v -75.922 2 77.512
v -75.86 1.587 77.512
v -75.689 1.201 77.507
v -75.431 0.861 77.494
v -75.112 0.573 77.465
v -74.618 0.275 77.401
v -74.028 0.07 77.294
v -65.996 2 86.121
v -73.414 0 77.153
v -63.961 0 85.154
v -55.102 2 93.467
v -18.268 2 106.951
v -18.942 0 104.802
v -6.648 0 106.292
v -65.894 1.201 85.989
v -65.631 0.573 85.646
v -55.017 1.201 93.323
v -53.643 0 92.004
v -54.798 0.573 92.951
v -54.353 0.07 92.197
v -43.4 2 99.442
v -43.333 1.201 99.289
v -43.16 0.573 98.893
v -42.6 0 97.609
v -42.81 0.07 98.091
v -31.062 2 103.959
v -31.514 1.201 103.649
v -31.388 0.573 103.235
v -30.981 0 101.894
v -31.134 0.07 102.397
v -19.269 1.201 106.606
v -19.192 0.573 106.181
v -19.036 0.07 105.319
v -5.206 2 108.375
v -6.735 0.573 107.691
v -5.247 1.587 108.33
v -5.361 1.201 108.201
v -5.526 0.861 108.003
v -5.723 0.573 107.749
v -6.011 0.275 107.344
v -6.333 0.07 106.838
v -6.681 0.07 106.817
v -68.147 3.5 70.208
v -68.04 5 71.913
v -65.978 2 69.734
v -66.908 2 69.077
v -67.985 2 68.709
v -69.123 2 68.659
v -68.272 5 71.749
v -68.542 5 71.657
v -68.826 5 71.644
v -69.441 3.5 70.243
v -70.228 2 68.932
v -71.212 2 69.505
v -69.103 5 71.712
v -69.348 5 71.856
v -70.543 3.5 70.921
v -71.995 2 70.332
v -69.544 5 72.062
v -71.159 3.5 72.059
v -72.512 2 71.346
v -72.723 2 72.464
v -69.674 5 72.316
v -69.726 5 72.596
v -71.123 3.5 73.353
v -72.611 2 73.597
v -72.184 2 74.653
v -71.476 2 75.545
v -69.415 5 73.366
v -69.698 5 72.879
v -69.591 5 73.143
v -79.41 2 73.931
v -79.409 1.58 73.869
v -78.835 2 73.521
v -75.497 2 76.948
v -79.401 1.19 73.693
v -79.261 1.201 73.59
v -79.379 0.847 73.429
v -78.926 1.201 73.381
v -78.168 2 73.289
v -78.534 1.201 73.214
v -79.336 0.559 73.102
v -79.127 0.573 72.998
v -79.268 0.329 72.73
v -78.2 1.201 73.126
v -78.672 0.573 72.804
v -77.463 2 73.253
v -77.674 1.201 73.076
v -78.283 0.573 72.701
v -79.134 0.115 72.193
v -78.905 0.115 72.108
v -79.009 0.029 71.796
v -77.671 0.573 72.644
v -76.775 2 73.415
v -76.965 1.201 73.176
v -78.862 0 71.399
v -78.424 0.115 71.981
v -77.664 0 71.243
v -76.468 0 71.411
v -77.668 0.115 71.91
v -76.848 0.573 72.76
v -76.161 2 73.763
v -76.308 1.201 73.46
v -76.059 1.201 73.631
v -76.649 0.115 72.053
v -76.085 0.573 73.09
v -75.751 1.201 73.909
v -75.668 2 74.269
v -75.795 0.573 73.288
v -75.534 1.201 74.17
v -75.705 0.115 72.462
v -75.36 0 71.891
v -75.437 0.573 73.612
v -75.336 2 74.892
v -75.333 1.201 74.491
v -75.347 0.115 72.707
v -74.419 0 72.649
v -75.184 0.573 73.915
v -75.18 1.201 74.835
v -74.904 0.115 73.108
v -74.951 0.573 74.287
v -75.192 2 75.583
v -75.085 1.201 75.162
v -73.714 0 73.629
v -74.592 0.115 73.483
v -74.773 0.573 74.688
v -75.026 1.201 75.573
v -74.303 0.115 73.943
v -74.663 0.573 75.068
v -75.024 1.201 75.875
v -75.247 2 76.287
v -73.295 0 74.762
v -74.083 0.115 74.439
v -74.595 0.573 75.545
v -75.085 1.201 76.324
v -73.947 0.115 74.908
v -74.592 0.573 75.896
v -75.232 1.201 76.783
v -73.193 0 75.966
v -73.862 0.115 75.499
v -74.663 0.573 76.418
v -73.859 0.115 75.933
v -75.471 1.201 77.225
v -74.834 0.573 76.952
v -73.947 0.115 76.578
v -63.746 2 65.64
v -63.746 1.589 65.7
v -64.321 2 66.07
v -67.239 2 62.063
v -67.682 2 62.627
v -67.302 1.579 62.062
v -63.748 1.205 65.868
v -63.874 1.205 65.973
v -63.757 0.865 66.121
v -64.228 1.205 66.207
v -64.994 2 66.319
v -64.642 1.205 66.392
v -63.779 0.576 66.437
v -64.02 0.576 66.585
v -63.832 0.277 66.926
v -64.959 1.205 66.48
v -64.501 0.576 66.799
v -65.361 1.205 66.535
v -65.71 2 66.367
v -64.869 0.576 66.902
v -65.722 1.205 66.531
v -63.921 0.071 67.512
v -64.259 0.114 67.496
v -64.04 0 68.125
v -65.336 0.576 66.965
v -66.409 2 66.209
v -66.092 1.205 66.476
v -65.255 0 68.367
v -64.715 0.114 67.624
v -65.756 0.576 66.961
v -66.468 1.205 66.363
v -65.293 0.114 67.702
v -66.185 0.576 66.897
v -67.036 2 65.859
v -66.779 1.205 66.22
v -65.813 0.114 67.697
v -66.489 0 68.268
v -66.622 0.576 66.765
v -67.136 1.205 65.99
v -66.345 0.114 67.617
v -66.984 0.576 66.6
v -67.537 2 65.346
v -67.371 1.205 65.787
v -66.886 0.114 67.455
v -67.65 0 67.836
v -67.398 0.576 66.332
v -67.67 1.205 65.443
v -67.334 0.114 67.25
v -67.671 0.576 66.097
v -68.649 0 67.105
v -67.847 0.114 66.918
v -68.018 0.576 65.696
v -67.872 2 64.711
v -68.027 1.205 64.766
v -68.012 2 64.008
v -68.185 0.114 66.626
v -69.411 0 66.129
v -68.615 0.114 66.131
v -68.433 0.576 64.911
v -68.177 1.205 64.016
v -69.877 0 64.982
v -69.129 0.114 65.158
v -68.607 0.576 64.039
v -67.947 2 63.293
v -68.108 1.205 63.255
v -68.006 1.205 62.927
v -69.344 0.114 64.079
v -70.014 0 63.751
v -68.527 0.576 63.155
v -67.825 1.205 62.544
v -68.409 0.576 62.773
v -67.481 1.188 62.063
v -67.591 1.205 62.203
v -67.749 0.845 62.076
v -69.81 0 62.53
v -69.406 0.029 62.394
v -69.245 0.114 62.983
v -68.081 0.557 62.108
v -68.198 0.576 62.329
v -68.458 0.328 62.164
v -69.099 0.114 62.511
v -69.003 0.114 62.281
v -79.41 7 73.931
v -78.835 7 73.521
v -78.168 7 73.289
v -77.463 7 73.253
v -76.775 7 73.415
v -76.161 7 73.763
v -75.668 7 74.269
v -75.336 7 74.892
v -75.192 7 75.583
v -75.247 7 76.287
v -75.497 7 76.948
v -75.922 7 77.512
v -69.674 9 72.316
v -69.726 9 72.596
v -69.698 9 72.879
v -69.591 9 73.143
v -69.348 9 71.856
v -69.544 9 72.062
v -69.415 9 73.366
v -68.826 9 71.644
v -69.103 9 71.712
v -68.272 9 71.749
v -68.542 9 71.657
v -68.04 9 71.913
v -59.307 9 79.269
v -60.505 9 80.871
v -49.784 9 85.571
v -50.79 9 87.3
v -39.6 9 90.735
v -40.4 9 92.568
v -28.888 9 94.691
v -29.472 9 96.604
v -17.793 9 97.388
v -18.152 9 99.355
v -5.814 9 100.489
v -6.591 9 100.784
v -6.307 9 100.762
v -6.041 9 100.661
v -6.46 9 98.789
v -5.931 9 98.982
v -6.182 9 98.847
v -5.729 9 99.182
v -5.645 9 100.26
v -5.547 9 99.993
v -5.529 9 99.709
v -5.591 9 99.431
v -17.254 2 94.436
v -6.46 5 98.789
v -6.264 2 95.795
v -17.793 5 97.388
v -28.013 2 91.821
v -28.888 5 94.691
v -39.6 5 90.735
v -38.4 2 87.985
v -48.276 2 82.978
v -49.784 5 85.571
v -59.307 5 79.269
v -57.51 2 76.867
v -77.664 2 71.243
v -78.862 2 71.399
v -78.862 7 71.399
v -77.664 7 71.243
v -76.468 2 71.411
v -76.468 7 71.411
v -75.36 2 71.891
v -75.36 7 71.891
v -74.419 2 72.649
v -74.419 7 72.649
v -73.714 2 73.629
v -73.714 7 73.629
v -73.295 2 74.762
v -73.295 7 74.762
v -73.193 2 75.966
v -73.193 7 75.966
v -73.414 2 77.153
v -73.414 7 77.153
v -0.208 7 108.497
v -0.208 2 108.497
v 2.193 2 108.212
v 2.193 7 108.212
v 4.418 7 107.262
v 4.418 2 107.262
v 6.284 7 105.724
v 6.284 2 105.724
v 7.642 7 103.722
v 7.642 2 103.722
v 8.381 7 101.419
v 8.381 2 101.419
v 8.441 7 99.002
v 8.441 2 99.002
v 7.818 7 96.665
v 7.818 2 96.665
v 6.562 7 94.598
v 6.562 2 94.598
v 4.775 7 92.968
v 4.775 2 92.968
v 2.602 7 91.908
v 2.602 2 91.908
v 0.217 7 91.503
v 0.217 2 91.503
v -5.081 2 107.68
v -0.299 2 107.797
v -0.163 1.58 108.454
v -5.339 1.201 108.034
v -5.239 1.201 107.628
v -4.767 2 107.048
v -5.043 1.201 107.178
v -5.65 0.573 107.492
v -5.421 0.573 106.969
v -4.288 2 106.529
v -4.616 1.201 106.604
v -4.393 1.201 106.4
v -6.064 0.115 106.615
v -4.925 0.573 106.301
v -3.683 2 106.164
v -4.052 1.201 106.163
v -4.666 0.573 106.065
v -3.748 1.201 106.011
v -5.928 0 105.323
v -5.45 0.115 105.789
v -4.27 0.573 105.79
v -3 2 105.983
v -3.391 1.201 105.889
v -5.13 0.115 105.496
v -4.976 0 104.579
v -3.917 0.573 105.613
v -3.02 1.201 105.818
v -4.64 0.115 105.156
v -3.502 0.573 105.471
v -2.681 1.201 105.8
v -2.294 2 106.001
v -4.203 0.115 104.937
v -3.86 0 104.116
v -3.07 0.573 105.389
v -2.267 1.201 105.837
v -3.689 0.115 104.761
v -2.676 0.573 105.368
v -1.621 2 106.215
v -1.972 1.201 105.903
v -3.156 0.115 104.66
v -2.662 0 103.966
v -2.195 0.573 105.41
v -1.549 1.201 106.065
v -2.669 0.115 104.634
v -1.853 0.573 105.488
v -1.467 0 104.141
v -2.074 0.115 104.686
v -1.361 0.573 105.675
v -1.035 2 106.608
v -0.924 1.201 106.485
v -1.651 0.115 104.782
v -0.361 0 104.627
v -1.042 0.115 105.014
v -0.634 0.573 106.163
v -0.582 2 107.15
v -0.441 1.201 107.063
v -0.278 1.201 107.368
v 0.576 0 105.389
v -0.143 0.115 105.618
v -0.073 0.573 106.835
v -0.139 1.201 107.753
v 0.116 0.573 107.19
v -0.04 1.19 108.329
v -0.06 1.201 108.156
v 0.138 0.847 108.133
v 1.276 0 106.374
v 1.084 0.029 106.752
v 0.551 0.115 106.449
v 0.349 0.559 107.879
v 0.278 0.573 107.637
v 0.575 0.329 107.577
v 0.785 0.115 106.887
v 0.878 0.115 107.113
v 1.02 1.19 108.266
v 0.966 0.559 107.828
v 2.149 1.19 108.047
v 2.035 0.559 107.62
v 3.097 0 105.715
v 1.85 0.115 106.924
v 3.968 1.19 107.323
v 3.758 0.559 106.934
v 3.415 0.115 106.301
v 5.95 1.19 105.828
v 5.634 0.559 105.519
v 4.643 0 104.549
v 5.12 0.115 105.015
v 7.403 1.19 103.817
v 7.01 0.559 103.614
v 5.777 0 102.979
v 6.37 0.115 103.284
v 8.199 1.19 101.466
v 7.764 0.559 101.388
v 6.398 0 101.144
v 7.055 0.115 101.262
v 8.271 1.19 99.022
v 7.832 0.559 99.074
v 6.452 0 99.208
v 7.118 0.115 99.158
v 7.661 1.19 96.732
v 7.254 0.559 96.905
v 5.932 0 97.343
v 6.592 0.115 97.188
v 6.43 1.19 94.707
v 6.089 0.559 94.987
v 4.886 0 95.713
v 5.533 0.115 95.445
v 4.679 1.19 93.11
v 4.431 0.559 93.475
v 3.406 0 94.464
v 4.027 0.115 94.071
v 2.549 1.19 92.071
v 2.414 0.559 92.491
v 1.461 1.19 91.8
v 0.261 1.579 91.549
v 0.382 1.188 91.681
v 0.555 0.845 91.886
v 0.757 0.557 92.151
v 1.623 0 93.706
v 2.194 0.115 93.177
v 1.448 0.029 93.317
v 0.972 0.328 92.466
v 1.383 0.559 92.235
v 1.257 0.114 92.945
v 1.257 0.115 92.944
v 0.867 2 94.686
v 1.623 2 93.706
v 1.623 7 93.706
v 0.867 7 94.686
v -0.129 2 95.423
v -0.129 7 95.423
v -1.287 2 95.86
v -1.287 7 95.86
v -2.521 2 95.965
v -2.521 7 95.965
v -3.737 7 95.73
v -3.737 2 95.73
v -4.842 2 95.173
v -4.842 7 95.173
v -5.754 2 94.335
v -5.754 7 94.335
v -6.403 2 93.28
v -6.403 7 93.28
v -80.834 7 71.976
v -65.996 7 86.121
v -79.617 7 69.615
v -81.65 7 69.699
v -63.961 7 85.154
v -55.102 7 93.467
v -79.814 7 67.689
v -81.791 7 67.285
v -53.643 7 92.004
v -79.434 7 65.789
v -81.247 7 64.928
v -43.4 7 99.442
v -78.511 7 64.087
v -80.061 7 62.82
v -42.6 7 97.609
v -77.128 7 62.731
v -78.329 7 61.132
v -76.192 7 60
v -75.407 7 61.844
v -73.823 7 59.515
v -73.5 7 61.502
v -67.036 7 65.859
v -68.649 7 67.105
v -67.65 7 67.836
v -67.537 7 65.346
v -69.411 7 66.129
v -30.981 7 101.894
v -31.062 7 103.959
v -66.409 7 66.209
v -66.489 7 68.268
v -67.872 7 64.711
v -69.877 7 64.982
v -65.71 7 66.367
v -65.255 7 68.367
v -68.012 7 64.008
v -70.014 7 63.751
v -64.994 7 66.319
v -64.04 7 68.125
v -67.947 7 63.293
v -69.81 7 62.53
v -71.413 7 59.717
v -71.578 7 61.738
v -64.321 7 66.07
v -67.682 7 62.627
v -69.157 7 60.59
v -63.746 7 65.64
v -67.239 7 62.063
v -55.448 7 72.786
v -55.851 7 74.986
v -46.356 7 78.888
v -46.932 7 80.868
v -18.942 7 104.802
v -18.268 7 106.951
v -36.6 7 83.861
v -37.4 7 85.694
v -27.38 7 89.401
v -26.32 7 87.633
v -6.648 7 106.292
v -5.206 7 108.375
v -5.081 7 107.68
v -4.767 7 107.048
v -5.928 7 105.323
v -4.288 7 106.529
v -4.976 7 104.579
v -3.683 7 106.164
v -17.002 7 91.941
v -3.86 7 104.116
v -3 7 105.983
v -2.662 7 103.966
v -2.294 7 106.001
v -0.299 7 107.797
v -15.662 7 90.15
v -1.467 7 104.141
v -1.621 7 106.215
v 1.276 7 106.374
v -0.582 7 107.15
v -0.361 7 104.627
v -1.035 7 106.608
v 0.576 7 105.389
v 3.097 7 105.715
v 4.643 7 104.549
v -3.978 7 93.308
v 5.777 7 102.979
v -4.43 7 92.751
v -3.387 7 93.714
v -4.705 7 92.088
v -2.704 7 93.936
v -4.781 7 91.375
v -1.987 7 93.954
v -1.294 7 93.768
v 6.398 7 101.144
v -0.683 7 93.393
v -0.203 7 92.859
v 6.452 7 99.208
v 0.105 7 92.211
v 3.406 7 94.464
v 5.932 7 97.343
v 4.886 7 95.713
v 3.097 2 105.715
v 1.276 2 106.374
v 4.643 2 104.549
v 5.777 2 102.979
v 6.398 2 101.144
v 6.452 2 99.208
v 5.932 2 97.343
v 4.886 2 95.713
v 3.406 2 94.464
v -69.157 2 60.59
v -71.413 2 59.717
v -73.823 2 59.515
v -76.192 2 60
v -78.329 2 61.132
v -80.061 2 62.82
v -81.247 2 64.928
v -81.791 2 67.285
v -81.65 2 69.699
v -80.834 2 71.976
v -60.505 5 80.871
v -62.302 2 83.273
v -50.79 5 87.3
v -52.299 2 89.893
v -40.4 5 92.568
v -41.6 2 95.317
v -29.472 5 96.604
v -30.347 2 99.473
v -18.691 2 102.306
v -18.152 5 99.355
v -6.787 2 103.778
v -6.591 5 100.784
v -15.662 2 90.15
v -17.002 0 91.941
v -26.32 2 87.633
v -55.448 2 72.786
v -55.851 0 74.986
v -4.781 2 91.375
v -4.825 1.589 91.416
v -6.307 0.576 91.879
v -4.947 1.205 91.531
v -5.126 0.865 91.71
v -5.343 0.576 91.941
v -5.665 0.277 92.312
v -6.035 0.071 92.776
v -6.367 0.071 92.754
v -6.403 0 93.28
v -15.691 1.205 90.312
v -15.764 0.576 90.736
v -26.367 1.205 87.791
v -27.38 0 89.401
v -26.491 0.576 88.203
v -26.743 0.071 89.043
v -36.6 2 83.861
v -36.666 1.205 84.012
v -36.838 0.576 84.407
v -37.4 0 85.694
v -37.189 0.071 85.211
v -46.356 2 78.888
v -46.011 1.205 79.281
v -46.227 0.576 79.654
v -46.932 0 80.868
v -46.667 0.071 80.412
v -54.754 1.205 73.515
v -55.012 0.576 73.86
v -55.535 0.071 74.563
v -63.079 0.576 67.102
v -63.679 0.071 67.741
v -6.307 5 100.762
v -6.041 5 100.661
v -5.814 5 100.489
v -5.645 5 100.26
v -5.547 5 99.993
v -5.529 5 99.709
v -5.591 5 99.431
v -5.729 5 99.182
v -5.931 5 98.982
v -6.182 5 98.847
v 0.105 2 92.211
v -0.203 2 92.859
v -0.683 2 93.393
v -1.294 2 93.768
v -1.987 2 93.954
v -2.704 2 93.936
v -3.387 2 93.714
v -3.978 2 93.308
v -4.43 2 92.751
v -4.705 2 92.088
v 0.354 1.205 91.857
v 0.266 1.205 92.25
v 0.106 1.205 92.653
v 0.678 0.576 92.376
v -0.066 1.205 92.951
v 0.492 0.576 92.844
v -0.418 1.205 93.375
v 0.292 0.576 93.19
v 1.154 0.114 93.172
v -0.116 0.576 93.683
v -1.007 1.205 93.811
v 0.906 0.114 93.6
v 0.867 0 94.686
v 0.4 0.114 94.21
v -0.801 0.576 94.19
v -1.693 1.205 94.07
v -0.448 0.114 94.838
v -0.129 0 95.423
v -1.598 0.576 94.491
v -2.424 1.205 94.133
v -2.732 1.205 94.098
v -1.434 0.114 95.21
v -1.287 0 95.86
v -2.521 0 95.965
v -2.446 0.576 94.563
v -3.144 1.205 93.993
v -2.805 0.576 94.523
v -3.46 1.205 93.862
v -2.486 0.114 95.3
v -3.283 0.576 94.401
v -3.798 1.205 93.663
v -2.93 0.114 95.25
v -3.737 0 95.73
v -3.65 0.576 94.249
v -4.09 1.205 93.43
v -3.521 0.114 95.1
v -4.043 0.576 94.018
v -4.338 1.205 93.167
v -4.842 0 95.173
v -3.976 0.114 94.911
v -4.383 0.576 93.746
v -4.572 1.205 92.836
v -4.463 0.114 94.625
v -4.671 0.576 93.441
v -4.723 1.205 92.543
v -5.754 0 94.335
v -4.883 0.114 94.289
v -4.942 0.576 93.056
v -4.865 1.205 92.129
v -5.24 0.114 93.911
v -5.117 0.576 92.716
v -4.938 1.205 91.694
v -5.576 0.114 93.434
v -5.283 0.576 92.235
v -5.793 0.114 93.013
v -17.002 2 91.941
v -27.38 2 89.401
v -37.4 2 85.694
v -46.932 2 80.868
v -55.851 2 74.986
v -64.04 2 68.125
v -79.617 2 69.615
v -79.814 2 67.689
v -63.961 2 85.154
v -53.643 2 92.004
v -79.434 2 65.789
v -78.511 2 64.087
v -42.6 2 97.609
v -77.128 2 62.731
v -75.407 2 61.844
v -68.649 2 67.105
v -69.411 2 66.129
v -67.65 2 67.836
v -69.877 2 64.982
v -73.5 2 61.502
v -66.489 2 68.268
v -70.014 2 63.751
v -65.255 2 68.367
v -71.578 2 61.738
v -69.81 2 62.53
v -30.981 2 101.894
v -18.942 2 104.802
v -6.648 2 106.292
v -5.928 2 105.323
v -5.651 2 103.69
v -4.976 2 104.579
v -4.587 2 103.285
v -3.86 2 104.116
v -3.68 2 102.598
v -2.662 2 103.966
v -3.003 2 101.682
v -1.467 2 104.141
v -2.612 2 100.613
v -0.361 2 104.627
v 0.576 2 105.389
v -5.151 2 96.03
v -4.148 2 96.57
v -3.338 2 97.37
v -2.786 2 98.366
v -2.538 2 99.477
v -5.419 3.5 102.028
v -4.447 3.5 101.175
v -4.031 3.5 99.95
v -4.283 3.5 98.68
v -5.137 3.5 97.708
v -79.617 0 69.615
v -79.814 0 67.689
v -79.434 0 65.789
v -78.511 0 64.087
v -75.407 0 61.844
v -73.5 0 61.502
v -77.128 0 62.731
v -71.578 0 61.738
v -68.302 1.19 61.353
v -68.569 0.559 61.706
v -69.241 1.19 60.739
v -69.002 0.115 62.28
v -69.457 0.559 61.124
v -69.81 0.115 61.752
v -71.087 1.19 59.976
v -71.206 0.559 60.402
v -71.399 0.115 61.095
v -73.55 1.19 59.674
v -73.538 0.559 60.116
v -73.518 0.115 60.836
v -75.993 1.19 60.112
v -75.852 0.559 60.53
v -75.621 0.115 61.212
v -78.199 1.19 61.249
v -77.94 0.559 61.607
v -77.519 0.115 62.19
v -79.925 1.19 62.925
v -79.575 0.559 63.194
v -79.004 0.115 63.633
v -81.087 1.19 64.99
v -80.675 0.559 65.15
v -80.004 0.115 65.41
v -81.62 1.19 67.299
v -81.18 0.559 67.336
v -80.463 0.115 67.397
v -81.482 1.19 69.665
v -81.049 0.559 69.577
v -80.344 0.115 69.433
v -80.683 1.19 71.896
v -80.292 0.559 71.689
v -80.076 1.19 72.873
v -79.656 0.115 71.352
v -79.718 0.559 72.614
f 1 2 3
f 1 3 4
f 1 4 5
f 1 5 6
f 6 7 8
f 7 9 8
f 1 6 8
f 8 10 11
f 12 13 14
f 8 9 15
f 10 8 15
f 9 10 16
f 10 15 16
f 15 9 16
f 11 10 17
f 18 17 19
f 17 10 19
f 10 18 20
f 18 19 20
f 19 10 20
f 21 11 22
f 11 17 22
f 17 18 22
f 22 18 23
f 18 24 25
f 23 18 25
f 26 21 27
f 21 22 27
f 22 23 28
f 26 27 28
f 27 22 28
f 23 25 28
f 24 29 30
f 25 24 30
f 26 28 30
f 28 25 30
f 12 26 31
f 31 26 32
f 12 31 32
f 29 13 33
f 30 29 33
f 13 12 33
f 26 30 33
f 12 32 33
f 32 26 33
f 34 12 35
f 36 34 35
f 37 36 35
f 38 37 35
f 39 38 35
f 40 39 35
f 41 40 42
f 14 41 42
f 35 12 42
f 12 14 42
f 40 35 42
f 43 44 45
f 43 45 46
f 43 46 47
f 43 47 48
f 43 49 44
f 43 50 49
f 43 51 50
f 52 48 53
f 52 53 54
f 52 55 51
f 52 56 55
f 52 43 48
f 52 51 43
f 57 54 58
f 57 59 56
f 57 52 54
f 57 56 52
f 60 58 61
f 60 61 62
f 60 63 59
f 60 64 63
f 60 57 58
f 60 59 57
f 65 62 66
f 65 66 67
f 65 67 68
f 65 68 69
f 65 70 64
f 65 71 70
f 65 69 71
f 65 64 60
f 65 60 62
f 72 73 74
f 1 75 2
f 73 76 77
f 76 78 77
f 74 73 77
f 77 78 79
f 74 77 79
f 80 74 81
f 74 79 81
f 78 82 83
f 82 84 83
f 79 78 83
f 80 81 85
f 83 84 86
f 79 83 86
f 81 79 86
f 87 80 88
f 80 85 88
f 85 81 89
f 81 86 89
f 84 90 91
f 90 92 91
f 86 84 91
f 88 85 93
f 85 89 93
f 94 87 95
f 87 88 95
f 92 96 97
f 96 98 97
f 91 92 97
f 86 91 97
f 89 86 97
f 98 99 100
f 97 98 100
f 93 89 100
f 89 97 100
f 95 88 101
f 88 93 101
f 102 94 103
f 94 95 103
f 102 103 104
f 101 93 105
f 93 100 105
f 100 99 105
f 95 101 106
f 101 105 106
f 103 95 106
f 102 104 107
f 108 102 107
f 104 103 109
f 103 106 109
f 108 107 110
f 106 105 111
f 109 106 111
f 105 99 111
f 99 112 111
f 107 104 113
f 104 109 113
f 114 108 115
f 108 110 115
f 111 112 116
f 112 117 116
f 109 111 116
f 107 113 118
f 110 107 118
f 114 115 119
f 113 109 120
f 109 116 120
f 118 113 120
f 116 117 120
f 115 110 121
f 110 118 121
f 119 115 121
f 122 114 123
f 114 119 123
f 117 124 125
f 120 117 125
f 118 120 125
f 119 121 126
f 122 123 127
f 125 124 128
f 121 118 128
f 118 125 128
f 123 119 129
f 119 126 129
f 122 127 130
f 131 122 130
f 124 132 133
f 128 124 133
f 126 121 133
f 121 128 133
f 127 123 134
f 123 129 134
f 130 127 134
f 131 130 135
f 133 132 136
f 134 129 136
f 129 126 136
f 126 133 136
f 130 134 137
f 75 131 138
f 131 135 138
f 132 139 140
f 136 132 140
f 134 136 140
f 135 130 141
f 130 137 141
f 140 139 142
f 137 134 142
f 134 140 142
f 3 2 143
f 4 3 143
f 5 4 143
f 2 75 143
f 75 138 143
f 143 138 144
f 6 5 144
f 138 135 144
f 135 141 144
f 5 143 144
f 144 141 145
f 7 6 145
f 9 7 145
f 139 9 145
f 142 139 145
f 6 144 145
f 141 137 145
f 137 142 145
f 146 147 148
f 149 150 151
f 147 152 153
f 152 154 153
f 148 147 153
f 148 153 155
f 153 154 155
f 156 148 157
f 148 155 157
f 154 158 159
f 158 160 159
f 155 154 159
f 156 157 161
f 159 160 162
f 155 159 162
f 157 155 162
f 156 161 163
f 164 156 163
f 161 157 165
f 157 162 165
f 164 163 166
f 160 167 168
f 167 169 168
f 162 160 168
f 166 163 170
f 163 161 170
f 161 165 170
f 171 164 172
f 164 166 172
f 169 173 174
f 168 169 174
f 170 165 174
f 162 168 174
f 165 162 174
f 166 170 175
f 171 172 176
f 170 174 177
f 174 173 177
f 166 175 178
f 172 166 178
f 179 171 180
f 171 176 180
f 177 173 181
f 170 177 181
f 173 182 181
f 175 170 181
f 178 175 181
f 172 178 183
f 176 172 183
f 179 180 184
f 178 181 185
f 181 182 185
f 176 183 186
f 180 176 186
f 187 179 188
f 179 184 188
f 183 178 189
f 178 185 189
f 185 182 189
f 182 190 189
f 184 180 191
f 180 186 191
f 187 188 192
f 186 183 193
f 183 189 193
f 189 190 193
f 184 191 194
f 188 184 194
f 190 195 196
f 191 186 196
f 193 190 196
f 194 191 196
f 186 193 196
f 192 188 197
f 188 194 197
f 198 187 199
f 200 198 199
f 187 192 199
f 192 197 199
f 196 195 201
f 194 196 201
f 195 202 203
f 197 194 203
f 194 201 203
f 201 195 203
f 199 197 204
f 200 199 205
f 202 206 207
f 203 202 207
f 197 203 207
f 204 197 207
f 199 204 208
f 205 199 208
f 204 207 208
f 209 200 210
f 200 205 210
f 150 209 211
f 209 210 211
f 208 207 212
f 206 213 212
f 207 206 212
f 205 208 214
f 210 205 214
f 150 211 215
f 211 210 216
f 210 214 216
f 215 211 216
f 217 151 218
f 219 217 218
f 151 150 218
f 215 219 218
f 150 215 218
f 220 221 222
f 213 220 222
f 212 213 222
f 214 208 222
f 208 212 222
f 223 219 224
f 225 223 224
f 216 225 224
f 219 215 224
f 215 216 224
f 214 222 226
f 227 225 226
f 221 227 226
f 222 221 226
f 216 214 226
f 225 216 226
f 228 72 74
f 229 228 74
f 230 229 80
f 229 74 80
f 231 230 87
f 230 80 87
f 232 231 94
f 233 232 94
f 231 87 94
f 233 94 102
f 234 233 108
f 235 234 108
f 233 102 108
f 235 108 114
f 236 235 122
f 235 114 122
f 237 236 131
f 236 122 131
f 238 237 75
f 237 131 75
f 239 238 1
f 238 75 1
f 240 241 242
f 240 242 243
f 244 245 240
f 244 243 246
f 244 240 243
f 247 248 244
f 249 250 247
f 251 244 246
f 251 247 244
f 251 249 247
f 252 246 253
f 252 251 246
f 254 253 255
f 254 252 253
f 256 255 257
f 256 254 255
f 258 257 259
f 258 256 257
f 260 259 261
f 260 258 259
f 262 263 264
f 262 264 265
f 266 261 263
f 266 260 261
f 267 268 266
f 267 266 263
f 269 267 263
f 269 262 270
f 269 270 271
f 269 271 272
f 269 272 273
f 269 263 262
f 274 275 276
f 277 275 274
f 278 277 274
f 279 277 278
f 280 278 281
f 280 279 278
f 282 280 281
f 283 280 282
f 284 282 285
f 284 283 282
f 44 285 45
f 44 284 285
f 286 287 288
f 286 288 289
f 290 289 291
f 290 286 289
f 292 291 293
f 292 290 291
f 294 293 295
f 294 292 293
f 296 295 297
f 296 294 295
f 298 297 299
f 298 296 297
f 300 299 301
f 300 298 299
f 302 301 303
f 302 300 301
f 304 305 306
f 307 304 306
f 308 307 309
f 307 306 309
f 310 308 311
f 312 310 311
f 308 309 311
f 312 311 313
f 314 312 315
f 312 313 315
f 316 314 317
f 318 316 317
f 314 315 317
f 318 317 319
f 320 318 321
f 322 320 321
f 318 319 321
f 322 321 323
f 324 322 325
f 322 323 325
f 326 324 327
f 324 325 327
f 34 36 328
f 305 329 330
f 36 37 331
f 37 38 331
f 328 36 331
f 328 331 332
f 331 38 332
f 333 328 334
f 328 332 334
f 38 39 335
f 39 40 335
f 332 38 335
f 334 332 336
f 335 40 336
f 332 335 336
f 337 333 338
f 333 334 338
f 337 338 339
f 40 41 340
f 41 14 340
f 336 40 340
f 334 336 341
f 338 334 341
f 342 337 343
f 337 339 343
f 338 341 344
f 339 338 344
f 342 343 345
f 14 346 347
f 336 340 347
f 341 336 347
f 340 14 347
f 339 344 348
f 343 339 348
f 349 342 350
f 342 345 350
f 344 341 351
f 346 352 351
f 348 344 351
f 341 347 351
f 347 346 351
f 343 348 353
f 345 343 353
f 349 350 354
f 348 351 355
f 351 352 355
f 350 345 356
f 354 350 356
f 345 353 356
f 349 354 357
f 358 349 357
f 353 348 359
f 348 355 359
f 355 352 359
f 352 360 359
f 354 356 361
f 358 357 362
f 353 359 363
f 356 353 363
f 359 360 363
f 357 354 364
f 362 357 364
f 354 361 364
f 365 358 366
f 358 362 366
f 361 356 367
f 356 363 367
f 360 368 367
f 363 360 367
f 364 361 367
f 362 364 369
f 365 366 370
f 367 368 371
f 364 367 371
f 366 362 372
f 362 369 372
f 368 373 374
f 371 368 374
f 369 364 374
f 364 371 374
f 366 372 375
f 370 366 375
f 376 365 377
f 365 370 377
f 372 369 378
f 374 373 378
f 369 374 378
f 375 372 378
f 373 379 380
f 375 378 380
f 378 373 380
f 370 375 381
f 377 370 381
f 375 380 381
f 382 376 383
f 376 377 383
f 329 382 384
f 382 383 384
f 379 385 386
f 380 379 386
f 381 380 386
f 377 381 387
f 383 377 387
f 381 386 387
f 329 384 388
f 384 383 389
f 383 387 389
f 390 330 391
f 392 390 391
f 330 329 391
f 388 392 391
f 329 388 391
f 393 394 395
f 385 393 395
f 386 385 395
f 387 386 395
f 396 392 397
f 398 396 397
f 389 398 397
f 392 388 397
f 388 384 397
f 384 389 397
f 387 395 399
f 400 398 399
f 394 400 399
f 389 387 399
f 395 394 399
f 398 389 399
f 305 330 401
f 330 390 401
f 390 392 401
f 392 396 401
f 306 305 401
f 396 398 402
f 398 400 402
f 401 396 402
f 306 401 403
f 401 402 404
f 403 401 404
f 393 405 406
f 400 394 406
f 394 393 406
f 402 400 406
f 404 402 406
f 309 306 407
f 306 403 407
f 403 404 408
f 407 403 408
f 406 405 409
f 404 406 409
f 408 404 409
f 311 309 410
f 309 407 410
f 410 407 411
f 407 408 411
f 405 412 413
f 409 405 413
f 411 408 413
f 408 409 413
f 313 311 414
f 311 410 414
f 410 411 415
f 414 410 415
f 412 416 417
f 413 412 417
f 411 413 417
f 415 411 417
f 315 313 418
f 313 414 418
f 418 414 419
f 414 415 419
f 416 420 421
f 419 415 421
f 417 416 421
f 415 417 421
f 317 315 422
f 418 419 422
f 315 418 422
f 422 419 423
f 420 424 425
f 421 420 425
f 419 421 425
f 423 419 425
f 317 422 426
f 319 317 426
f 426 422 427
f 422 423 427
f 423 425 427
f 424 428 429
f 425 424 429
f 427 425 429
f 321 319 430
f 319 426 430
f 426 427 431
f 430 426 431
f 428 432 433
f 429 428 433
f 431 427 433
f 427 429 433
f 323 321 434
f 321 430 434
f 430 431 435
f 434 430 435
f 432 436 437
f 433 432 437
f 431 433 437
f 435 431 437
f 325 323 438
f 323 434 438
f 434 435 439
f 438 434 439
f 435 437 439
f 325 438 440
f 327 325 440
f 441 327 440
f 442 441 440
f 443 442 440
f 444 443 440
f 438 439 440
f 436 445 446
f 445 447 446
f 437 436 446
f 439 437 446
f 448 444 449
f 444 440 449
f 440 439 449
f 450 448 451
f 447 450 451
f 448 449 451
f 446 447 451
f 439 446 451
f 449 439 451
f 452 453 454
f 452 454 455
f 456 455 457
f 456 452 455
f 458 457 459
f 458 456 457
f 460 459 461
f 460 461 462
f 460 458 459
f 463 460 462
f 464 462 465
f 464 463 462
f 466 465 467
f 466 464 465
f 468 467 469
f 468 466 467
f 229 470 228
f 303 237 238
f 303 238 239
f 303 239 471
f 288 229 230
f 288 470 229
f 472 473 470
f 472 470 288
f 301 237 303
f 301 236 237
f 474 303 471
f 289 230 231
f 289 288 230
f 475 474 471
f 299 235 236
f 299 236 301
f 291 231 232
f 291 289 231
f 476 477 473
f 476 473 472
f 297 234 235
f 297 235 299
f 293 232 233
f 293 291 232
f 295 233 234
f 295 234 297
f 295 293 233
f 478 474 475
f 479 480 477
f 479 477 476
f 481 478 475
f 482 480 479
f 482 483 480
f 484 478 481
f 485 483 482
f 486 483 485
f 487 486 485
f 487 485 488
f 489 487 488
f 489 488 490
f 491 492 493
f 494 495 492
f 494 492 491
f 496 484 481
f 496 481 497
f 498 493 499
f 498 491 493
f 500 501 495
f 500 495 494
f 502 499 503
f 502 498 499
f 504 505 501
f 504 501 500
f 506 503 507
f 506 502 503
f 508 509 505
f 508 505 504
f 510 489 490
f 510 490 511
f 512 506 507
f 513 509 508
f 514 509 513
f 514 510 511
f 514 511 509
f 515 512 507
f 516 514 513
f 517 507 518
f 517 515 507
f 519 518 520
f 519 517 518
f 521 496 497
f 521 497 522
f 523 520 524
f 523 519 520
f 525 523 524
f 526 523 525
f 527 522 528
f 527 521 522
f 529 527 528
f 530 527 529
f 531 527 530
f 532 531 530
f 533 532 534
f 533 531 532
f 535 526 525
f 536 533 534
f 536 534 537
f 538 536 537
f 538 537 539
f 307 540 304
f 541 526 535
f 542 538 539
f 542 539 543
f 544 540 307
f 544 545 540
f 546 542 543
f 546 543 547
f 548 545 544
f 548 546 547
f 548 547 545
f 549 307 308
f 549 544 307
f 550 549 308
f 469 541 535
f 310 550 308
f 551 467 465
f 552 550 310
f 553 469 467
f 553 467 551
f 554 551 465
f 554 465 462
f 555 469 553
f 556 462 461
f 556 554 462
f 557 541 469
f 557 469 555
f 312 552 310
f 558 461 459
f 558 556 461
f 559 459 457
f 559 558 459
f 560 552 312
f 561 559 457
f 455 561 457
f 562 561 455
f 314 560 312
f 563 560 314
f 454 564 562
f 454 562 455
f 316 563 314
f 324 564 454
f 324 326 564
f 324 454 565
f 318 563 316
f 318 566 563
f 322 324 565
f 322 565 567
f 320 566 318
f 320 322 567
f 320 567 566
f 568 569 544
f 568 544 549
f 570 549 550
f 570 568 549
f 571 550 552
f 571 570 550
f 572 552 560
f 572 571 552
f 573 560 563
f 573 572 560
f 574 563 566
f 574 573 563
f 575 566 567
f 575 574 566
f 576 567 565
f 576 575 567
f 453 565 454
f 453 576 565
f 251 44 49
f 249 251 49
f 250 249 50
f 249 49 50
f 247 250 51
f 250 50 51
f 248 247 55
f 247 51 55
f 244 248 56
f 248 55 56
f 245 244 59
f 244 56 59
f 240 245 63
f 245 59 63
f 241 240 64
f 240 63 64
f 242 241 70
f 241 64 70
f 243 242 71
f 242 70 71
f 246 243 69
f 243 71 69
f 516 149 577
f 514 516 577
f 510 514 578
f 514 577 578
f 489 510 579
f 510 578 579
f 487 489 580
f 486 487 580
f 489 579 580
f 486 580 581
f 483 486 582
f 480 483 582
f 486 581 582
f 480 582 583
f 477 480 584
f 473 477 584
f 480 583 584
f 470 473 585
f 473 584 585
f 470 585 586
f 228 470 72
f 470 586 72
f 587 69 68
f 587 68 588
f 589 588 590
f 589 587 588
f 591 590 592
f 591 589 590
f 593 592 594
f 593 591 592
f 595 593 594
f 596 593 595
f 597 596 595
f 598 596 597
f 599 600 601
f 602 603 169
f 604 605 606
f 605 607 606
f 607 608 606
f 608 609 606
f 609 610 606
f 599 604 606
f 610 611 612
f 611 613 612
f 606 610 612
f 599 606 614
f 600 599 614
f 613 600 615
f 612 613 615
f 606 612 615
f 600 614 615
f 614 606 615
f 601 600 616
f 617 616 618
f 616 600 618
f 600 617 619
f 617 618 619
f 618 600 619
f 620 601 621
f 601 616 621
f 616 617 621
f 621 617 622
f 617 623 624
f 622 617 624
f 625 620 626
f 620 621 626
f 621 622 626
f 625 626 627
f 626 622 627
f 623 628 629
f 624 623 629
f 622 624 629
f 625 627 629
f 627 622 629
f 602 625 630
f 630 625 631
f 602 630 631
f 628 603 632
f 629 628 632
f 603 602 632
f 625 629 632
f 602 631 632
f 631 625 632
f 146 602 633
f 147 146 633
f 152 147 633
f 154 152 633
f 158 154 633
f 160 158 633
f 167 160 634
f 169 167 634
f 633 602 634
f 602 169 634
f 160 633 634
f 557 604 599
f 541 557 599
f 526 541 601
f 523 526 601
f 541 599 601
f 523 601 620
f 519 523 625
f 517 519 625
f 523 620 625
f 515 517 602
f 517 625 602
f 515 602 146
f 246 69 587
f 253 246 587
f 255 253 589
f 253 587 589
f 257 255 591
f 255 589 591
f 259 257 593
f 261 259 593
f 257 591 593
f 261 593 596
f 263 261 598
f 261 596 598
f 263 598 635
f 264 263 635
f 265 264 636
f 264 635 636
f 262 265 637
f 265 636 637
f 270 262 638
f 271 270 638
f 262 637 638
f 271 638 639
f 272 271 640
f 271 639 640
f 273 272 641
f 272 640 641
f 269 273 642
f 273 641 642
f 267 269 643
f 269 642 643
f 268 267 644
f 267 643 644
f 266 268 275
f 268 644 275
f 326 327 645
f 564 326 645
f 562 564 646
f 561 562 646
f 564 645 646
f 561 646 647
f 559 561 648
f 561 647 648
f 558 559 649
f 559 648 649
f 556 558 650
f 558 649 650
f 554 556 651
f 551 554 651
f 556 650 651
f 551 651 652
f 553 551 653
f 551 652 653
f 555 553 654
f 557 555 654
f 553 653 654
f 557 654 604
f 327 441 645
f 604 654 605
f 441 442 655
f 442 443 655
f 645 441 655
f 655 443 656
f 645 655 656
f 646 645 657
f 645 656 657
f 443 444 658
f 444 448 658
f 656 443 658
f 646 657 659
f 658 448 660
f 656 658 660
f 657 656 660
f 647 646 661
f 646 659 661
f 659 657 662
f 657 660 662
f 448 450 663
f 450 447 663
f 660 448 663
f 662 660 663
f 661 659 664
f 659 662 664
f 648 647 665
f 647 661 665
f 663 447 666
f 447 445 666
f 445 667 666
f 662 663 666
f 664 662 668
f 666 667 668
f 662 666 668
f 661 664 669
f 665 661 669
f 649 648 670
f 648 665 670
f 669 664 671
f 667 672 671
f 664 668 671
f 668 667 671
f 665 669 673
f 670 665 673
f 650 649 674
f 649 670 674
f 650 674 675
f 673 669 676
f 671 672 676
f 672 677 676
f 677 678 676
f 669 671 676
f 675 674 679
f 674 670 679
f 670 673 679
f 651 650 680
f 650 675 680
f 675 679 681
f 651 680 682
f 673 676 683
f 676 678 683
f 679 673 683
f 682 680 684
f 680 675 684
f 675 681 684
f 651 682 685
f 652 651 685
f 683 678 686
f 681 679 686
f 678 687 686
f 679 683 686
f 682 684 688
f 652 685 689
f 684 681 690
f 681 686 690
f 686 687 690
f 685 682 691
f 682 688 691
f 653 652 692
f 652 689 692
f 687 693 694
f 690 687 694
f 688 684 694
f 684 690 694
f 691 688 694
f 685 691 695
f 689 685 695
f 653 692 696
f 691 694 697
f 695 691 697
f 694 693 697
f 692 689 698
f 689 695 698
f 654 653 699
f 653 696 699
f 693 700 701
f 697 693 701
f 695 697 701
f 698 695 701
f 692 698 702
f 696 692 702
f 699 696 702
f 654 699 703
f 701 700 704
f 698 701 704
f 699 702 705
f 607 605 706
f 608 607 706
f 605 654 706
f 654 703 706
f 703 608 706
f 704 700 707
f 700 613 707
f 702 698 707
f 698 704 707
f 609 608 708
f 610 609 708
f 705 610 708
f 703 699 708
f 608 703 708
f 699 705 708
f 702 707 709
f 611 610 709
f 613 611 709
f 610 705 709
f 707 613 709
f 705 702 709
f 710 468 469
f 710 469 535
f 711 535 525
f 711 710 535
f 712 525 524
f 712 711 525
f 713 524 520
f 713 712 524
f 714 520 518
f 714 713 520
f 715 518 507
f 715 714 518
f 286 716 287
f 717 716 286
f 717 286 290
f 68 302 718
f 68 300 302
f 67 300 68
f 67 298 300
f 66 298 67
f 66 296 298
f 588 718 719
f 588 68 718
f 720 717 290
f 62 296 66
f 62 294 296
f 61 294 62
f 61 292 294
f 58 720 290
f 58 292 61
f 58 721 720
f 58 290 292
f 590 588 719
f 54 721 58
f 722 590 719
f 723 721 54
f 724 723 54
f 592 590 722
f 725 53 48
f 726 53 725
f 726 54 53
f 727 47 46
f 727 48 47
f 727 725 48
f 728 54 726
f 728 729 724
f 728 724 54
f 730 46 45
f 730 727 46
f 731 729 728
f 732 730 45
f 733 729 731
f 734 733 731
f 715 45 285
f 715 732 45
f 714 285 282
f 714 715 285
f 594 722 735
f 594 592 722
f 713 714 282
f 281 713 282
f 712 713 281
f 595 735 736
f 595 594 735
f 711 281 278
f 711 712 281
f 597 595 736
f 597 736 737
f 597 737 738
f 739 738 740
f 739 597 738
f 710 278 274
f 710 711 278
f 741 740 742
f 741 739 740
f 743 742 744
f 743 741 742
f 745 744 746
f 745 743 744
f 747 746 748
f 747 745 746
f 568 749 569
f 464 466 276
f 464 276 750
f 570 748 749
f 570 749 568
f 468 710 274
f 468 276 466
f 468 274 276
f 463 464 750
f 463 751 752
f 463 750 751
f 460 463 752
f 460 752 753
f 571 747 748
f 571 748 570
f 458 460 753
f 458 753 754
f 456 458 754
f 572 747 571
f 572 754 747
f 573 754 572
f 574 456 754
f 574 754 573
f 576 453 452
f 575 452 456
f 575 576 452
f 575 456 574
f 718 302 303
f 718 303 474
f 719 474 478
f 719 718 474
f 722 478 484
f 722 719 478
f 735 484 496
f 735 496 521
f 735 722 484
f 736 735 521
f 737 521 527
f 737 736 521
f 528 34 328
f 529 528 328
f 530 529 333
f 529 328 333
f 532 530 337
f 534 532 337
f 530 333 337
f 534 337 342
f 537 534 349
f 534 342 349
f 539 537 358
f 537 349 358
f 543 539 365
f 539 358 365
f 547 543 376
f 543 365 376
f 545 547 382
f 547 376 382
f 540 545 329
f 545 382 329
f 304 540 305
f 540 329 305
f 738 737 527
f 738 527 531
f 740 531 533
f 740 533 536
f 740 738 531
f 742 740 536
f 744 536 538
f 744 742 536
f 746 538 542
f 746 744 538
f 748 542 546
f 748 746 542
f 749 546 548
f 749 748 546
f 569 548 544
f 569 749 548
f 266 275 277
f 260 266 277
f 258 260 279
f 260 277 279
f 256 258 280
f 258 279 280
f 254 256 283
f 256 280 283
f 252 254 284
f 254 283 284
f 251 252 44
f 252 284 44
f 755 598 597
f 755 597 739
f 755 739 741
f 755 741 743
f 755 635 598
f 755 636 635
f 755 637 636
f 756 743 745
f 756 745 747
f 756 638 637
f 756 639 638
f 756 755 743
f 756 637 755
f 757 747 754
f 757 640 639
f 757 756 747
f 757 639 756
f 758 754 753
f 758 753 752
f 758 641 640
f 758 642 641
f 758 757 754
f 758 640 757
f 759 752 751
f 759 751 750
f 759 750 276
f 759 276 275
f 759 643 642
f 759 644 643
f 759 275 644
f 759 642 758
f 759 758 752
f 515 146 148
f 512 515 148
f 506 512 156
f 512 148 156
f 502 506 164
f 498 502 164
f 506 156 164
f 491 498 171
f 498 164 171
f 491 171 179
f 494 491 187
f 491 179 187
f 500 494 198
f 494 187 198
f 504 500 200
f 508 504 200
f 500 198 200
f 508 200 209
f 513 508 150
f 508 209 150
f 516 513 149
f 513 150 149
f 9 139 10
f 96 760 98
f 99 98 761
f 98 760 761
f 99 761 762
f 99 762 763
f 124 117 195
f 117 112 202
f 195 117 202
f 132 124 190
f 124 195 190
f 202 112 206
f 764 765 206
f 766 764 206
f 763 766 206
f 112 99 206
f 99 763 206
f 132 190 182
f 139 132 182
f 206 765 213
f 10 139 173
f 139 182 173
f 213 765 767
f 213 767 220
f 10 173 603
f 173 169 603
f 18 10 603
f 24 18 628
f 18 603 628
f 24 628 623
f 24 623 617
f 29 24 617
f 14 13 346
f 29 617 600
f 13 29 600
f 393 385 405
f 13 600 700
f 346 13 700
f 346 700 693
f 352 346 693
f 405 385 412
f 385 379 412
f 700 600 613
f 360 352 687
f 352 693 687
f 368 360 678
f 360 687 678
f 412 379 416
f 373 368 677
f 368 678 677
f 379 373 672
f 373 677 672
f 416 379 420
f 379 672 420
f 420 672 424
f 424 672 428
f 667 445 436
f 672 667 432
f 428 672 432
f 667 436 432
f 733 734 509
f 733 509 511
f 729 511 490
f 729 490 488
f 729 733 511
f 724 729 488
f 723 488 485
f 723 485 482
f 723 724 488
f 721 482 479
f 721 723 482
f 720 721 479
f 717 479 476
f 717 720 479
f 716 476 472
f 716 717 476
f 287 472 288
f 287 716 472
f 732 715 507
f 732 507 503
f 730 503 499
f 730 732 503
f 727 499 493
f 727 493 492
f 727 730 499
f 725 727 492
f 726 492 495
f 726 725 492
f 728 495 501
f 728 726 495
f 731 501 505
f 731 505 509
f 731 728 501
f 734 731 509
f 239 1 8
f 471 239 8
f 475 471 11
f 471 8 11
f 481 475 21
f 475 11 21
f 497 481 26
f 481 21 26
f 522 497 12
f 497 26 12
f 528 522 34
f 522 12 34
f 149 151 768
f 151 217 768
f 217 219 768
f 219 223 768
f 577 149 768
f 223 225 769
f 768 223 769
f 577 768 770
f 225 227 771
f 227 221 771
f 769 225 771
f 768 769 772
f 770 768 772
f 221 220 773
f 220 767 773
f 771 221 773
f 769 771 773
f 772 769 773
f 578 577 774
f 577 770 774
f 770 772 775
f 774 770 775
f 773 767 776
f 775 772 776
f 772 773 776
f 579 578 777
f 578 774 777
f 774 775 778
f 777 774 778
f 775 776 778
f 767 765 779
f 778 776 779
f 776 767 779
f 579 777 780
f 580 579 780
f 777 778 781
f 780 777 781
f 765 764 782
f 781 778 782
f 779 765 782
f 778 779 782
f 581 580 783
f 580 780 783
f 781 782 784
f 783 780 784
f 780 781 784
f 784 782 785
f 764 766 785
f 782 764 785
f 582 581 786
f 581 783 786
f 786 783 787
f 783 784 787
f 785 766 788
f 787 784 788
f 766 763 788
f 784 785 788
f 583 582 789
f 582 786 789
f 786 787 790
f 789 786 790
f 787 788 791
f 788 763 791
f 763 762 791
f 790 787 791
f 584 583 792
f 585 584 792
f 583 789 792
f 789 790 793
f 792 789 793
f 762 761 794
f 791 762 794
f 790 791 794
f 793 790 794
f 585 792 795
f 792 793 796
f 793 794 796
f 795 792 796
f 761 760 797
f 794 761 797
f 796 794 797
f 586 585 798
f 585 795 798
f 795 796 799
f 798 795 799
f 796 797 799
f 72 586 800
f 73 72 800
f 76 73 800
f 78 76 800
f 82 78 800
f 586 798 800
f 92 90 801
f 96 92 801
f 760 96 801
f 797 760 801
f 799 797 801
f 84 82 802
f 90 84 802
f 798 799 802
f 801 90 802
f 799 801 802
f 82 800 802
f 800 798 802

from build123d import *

# Parameters (mm, degrees)
BOSS_EXTRUDE1_DEPTH = 7
FILLET1_R           = 2
SHELL1_START        = 2
SHELL1_DEPTH        = 5
BOSS_EXTRUDE2_DEPTH = 7
CHAMFER2_SIZE       = 3


# Read off the part's stored shape, not the designer's step: Shell1
with BuildPart() as part:
    # Sketch2 → Boss-Extrude1 (new body)
    with BuildSketch(Plane(origin=(0, 0, 0), x_dir=(1, 0, 0), z_dir=(0, 1, 0))):
        with BuildLine():
            ThreePointArc((-0.208151075, -108.497450978), (8.497338934, -100.212675907), (0.217200678, -91.50277552))
            ThreePointArc((0.217200678, -91.50277552), (-2.346486536, -93.970707759), (-4.780740732, -91.375021303))
            ThreePointArc((-4.780740732, -91.375021303), (-36.6, -83.861135218), (-63.746368582, -65.640311491))
            ThreePointArc((-63.746368582, -65.640311491), (-67.304850182, -65.620553623), (-67.23863968, -62.062633186))
            ThreePointArc((-67.23863968, -62.062633186), (-79.255338145, -61.914267797), (-79.41010236, -73.930885555))
            ThreePointArc((-79.41010236, -73.930885555), (-75.896472672, -73.998145219), (-75.921596958, -77.512328796))
            ThreePointArc((-75.921596958, -77.512328796), (-43.4, -99.441892581), (-5.206292309, -108.375017972))
            ThreePointArc((-5.206292309, -108.375017972), (-2.646734863, -105.966951709), (-0.208151075, -108.497450978))
        make_face()
    extrude(amount=BOSS_EXTRUDE1_DEPTH)

    # Fillet1
    fillet1_edges = [part.edges().sort_by_distance(p)[0] for p in [
        (8.497338934, 0, 100.212675907),
        (-2.646734863, 0, 105.966951709),
        (-43.4, 0, 99.441892581),
        (-75.896472672, 0, 73.998145219),
        (-79.255338145, 0, 61.914267797),
        (-67.304850182, 0, 65.620553623),
        (-36.6, 0, 83.861135218),
        (-2.346486536, 0, 93.970707759),
    ]]
    fillet(fillet1_edges, radius=FILLET1_R)

    # Shell1 outline → Shell1 (cut)
    with BuildSketch(Plane(origin=(0, 0, 0), x_dir=(1, 0, 0), z_dir=(0, 1, 0)).offset(SHELL1_START)):
        with BuildLine():
            ThreePointArc((-73.41414546, -77.153180403), (-42.6, -97.608862303), (-6.648027376, -106.292303259))
            ThreePointArc((-6.648027376, -106.292303259), (-2.661816514, -103.96643854), (1.275863774, -106.373552513))
            ThreePointArc((1.275863774, -106.373552513), (6.497554678, -100.178278459), (1.623433321, -93.705997756))
            ThreePointArc((1.623433321, -93.705997756), (-2.520823959, -95.965214247), (-6.402993063, -93.280499998))
            ThreePointArc((-6.402993063, -93.280499998), (-37.4, -85.694165496), (-64.040357054, -68.12549206))
            ThreePointArc((-64.040357054, -68.12549206), (-68.648697048, -67.104644345), (-69.810307104, -62.529757501))
            ThreePointArc((-69.810307104, -62.529757501), (-77.870264225, -63.357143569), (-78.861964379, -71.398536938))
            ThreePointArc((-78.861964379, -71.398536938), (-74.419416665, -72.648854313), (-73.41414546, -77.153180403))
        make_face()
    extrude(amount=SHELL1_DEPTH, mode=Mode.SUBTRACT)

    # Sketch3 → Boss-Extrude2 (add)
    with BuildSketch(Plane(origin=(0, 2, 0), x_dir=(1, 0, 0), z_dir=(0, 1, 0))):
        with BuildLine():
            ThreePointArc((-69.414526923, -73.365732927), (-40.399816467, -92.56760851), (-6.590765621, -100.784270223))
            ThreePointArc((-6.590765621, -100.784270223), (-5.527641624, -99.85165703), (-6.460254818, -98.788533033))
            ThreePointArc((-6.460254818, -98.788533033), (-39.599816467, -90.734578232), (-68.039975591, -71.912939536))
            ThreePointArc((-68.039975591, -71.912939536), (-69.453647952, -71.952060566), (-69.414526923, -73.365732927))
        make_face()
    extrude(amount=BOSS_EXTRUDE2_DEPTH)

    # Chamfer2
    chamfer2_edges = [part.edges().sort_by_distance(p)[0] for p in [
        (-69.453647952, 2, 71.952060566),
        (-40.399816467, 2, 92.56760851),
        (-5.527641624, 2, 99.85165703),
        (-39.599816467, 2, 90.734578232),
    ]]
    chamfer(chamfer2_edges, length=CHAMFER2_SIZE)


solid = part.part
